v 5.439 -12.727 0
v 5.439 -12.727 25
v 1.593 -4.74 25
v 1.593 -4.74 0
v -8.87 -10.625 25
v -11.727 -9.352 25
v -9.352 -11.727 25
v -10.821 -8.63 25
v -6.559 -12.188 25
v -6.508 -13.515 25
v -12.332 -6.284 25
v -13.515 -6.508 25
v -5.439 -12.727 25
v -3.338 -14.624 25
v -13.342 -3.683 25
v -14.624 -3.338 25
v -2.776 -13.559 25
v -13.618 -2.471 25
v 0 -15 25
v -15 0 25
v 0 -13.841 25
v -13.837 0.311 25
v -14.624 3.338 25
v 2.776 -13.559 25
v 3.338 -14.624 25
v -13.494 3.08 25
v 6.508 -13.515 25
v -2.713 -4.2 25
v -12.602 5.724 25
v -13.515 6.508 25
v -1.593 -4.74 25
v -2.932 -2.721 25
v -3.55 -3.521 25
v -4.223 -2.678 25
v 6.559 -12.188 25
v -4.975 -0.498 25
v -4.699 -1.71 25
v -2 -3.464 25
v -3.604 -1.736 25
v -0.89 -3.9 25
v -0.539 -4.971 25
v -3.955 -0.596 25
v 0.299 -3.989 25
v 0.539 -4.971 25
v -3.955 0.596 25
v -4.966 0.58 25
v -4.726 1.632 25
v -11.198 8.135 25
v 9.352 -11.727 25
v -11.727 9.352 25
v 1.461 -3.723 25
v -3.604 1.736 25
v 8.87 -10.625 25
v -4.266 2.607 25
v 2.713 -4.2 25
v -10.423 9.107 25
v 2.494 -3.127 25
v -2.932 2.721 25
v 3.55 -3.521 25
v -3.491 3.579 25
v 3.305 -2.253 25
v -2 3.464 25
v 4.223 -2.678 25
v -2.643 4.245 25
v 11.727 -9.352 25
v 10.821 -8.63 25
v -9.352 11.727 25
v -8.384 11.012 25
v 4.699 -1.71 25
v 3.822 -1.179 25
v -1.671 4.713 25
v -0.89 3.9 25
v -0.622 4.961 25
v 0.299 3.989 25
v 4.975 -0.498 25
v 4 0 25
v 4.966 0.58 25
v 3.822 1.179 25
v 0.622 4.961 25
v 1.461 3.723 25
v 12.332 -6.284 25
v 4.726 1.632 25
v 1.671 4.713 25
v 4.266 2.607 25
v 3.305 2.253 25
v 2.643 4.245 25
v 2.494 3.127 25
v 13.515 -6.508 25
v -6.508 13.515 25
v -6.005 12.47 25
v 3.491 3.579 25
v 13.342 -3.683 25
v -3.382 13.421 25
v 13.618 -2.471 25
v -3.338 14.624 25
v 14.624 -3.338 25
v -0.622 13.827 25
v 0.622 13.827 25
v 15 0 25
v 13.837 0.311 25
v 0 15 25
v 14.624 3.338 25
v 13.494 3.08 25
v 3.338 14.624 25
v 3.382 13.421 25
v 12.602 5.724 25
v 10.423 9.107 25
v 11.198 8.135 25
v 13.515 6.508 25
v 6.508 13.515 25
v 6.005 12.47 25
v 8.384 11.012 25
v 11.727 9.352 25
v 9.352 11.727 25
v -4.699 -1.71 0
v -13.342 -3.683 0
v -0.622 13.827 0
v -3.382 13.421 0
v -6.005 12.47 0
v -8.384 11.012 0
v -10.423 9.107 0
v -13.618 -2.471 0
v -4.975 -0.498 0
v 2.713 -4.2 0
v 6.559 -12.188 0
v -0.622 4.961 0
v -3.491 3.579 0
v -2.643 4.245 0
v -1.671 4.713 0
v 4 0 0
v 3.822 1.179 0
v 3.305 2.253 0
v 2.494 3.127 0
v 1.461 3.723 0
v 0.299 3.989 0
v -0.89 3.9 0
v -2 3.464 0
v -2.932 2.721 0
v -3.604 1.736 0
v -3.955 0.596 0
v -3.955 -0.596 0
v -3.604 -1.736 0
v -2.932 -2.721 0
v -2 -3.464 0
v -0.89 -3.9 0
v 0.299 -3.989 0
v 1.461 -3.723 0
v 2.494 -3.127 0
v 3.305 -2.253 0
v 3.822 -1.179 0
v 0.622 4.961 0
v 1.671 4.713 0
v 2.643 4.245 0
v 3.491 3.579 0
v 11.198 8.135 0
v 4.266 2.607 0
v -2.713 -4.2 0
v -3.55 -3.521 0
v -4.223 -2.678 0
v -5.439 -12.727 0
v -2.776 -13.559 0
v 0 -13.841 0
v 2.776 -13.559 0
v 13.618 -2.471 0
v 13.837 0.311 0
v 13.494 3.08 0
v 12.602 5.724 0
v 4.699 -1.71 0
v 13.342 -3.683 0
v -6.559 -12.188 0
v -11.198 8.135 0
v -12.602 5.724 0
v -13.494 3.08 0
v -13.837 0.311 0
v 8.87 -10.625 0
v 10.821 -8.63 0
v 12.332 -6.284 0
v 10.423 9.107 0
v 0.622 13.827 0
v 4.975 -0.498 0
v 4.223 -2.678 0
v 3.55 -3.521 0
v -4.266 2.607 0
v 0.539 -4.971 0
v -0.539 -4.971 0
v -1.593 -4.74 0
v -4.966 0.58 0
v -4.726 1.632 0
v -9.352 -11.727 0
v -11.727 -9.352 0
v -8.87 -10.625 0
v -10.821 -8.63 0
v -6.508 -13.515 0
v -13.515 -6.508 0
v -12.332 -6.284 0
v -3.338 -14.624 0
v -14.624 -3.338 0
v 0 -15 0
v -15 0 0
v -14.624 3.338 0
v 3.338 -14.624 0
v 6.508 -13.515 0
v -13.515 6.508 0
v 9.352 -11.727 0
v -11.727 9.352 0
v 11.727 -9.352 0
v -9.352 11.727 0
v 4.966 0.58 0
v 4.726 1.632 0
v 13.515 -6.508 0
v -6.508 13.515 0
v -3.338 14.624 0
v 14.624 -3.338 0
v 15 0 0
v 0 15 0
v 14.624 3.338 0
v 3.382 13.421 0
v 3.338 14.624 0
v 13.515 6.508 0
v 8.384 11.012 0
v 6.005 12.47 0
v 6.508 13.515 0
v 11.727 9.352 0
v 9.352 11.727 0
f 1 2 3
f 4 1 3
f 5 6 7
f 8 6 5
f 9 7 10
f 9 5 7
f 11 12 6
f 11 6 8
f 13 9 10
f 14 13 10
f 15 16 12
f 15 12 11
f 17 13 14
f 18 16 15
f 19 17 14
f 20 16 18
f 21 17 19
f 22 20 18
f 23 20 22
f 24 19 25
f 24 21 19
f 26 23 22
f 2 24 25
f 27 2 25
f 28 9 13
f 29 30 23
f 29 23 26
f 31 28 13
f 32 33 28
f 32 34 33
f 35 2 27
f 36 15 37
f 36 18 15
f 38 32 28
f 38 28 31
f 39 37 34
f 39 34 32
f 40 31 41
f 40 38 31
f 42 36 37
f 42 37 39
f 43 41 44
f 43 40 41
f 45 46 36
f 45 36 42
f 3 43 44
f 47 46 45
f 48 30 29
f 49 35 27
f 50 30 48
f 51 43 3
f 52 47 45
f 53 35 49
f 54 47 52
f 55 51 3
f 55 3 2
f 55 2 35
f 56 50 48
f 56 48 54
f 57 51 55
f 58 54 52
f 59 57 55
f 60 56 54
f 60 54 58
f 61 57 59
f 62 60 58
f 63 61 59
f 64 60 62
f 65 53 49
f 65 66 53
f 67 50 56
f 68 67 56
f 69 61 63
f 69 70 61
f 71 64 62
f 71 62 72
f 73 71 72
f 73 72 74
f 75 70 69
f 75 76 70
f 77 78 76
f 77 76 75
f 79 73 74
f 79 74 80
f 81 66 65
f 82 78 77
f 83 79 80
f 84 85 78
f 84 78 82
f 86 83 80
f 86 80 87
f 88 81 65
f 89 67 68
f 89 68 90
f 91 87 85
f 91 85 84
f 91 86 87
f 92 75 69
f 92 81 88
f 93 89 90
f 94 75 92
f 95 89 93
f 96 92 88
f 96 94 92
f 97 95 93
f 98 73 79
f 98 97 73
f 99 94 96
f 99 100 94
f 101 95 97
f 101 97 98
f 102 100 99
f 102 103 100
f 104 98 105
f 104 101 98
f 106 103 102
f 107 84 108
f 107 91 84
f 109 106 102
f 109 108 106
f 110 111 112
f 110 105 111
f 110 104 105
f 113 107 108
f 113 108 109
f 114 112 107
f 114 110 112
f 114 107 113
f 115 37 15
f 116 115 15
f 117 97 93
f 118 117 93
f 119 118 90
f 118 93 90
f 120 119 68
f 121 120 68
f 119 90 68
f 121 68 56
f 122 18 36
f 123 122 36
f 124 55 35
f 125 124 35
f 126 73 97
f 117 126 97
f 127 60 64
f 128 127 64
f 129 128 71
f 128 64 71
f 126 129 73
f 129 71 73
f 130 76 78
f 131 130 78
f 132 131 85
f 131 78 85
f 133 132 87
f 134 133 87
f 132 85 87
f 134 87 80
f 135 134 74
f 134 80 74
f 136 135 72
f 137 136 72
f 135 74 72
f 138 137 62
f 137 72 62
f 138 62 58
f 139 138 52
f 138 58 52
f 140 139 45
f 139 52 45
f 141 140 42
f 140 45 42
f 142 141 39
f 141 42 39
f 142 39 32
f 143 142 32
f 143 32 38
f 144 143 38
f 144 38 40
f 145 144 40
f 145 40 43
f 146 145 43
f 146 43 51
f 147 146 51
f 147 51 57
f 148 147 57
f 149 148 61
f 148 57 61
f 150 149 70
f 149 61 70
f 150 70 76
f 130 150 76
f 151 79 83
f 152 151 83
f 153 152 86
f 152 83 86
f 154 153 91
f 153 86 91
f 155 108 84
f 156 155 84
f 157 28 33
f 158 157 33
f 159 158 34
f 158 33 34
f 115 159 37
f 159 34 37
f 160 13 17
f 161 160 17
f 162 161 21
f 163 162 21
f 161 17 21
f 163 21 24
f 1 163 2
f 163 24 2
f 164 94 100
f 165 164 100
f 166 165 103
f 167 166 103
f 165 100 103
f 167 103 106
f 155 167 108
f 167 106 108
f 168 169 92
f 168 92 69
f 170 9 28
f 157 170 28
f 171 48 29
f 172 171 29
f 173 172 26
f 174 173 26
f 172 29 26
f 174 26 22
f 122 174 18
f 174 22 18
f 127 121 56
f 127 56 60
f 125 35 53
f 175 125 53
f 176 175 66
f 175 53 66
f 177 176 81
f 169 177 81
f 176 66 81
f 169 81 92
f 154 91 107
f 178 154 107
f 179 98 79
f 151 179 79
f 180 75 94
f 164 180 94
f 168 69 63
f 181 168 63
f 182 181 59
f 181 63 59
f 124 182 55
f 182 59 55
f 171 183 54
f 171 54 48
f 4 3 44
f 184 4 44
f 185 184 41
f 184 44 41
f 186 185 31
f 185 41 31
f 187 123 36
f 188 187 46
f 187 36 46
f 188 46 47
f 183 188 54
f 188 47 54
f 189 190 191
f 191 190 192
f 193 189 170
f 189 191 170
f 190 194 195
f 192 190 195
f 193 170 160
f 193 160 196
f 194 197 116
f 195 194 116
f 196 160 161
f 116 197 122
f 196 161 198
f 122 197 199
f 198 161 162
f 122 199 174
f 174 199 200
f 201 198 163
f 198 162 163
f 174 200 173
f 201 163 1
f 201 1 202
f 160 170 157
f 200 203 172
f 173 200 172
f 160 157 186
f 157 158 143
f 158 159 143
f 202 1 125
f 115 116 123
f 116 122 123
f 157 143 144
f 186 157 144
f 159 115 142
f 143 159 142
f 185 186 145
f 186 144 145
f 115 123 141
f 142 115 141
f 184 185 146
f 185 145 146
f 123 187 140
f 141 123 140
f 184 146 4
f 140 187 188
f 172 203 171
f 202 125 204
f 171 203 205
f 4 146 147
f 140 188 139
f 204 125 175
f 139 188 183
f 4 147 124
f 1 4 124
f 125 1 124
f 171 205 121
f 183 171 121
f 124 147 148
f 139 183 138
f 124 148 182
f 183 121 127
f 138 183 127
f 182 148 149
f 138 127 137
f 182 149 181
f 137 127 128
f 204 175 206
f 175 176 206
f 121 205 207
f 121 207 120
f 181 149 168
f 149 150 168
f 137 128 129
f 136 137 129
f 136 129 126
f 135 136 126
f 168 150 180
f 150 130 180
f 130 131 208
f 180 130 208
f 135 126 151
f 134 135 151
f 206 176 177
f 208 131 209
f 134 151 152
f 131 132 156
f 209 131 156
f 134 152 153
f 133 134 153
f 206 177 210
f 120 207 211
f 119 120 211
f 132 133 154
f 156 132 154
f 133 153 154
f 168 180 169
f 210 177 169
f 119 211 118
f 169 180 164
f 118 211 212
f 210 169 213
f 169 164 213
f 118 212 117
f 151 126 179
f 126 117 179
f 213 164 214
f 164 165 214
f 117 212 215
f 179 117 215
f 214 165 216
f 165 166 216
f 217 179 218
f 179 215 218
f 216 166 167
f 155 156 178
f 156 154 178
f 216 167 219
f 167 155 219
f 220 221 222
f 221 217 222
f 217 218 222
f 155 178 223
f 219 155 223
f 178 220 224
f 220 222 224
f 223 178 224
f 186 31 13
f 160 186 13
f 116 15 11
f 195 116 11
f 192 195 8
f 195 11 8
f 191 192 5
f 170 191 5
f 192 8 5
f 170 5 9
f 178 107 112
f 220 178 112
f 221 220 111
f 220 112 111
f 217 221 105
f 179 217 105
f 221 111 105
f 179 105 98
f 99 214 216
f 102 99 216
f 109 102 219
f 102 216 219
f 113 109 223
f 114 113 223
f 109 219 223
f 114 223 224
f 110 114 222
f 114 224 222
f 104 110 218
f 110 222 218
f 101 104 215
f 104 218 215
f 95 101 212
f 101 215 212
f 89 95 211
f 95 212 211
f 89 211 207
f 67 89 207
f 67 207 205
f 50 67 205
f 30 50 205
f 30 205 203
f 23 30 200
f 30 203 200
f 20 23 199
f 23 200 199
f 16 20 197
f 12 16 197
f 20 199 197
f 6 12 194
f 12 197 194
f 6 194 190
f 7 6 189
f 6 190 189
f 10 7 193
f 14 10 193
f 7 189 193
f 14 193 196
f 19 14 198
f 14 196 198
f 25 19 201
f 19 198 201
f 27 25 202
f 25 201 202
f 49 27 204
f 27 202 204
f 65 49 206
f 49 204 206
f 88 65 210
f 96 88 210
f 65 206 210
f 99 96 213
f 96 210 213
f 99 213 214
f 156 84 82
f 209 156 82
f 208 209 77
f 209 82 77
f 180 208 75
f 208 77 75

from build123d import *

# Parameters (mm, degrees)
SKETCH1_R           = 15
BOSS_EXTRUDE1_DEPTH = 25
SKETCH2_R           = 4
CUT_EXTRUDE1_DEPTH  = 25


with BuildPart() as part:
    # Sketch1 → Boss-Extrude1 (new body)
    with BuildSketch(Plane.XY):
        Circle(SKETCH1_R)
    extrude(amount=BOSS_EXTRUDE1_DEPTH)

    # Sketch2 → Cut-Extrude1 (cut)
    with BuildSketch(Plane.XY.offset(25)):
        with BuildLine():
            ThreePointArc((10.42269345, 9.106766731), (6.005266621, 12.47006463), (0.621513859, 13.826766056))
            Line((0.621513859, 13.826766056), (0.621513859, 4.961221676))
            ThreePointArc((0.621513859, 4.961221676), (2.169418696, 4.50484434), (3.491331745, 3.579190222))
            Line((3.491331745, 3.579190222), (10.42269345, 9.106766731))
        make_face()
        with BuildLine():
            Line((-0.621513859, 4.961221676), (-0.621513859, 13.826766056))
            ThreePointArc((-0.621513859, 13.826766056), (-6.005266621, 12.47006463), (-10.42269345, 9.106766731))
            Line((-10.42269345, 9.106766731), (-3.491331745, 3.579190222))
            ThreePointArc((-3.491331745, 3.579190222), (-2.169418696, 4.50484434), (-0.621513859, 4.961221676))
        make_face()
        Circle(SKETCH2_R)
        with BuildLine():
            ThreePointArc((13.618400008, -2.470813687), (13.493711611, 3.079851621), (11.197708557, 8.134928527))
            Line((11.197708557, 8.134928527), (4.266346851, 2.607352018))
            ThreePointArc((4.266346851, 2.607352018), (4.874639561, 1.11260467), (4.975133335, -0.498044472))
            Line((4.975133335, -0.498044472), (13.618400008, -2.470813687))
        make_face()
        with BuildLine():
            Line((-4.266346851, 2.607352018), (-11.197708557, 8.134928527))
            ThreePointArc((-11.197708557, 8.134928527), (-13.493711611, 3.079851621), (-13.618400008, -2.470813687))
            Line((-13.618400008, -2.470813687), (-4.975133335, -0.498044472))
            ThreePointArc((-4.975133335, -0.498044472), (-4.874639561, 1.11260467), (-4.266346851, 2.607352018))
        make_face()
        with BuildLine():
            ThreePointArc((6.559173595, -12.187821003), (10.821116537, -8.629552476), (13.341800319, -3.682676106))
            Line((13.341800319, -3.682676106), (4.698533646, -1.70990689))
            ThreePointArc((4.698533646, -1.70990689), (3.909157412, -3.117449009), (2.71255805, -4.20024152))
            Line((2.71255805, -4.20024152), (6.559173595, -12.187821003))
        make_face()
        with BuildLine():
            Line((-4.698533646, -1.70990689), (-13.341800319, -3.682676106))
            ThreePointArc((-13.341800319, -3.682676106), (-10.821116537, -8.629552476), (-6.559173595, -12.187821003))
            Line((-6.559173595, -12.187821003), (-2.71255805, -4.20024152))
            ThreePointArc((-2.71255805, -4.20024152), (-3.909157412, -3.117449009), (-4.698533646, -1.70990689))
        make_face()
        with BuildLine():
            ThreePointArc((-5.439244318, -12.727150518), (0, -13.840727548), (5.439244318, -12.727150518))
            Line((5.439244318, -12.727150518), (1.592628773, -4.739571034))
            ThreePointArc((1.592628773, -4.739571034), (0, -5), (-1.592628773, -4.739571034))
            Line((-1.592628773, -4.739571034), (-5.439244318, -12.727150518))
        make_face()
    extrude(amount=-CUT_EXTRUDE1_DEPTH, mode=Mode.SUBTRACT)


solid = part.part
